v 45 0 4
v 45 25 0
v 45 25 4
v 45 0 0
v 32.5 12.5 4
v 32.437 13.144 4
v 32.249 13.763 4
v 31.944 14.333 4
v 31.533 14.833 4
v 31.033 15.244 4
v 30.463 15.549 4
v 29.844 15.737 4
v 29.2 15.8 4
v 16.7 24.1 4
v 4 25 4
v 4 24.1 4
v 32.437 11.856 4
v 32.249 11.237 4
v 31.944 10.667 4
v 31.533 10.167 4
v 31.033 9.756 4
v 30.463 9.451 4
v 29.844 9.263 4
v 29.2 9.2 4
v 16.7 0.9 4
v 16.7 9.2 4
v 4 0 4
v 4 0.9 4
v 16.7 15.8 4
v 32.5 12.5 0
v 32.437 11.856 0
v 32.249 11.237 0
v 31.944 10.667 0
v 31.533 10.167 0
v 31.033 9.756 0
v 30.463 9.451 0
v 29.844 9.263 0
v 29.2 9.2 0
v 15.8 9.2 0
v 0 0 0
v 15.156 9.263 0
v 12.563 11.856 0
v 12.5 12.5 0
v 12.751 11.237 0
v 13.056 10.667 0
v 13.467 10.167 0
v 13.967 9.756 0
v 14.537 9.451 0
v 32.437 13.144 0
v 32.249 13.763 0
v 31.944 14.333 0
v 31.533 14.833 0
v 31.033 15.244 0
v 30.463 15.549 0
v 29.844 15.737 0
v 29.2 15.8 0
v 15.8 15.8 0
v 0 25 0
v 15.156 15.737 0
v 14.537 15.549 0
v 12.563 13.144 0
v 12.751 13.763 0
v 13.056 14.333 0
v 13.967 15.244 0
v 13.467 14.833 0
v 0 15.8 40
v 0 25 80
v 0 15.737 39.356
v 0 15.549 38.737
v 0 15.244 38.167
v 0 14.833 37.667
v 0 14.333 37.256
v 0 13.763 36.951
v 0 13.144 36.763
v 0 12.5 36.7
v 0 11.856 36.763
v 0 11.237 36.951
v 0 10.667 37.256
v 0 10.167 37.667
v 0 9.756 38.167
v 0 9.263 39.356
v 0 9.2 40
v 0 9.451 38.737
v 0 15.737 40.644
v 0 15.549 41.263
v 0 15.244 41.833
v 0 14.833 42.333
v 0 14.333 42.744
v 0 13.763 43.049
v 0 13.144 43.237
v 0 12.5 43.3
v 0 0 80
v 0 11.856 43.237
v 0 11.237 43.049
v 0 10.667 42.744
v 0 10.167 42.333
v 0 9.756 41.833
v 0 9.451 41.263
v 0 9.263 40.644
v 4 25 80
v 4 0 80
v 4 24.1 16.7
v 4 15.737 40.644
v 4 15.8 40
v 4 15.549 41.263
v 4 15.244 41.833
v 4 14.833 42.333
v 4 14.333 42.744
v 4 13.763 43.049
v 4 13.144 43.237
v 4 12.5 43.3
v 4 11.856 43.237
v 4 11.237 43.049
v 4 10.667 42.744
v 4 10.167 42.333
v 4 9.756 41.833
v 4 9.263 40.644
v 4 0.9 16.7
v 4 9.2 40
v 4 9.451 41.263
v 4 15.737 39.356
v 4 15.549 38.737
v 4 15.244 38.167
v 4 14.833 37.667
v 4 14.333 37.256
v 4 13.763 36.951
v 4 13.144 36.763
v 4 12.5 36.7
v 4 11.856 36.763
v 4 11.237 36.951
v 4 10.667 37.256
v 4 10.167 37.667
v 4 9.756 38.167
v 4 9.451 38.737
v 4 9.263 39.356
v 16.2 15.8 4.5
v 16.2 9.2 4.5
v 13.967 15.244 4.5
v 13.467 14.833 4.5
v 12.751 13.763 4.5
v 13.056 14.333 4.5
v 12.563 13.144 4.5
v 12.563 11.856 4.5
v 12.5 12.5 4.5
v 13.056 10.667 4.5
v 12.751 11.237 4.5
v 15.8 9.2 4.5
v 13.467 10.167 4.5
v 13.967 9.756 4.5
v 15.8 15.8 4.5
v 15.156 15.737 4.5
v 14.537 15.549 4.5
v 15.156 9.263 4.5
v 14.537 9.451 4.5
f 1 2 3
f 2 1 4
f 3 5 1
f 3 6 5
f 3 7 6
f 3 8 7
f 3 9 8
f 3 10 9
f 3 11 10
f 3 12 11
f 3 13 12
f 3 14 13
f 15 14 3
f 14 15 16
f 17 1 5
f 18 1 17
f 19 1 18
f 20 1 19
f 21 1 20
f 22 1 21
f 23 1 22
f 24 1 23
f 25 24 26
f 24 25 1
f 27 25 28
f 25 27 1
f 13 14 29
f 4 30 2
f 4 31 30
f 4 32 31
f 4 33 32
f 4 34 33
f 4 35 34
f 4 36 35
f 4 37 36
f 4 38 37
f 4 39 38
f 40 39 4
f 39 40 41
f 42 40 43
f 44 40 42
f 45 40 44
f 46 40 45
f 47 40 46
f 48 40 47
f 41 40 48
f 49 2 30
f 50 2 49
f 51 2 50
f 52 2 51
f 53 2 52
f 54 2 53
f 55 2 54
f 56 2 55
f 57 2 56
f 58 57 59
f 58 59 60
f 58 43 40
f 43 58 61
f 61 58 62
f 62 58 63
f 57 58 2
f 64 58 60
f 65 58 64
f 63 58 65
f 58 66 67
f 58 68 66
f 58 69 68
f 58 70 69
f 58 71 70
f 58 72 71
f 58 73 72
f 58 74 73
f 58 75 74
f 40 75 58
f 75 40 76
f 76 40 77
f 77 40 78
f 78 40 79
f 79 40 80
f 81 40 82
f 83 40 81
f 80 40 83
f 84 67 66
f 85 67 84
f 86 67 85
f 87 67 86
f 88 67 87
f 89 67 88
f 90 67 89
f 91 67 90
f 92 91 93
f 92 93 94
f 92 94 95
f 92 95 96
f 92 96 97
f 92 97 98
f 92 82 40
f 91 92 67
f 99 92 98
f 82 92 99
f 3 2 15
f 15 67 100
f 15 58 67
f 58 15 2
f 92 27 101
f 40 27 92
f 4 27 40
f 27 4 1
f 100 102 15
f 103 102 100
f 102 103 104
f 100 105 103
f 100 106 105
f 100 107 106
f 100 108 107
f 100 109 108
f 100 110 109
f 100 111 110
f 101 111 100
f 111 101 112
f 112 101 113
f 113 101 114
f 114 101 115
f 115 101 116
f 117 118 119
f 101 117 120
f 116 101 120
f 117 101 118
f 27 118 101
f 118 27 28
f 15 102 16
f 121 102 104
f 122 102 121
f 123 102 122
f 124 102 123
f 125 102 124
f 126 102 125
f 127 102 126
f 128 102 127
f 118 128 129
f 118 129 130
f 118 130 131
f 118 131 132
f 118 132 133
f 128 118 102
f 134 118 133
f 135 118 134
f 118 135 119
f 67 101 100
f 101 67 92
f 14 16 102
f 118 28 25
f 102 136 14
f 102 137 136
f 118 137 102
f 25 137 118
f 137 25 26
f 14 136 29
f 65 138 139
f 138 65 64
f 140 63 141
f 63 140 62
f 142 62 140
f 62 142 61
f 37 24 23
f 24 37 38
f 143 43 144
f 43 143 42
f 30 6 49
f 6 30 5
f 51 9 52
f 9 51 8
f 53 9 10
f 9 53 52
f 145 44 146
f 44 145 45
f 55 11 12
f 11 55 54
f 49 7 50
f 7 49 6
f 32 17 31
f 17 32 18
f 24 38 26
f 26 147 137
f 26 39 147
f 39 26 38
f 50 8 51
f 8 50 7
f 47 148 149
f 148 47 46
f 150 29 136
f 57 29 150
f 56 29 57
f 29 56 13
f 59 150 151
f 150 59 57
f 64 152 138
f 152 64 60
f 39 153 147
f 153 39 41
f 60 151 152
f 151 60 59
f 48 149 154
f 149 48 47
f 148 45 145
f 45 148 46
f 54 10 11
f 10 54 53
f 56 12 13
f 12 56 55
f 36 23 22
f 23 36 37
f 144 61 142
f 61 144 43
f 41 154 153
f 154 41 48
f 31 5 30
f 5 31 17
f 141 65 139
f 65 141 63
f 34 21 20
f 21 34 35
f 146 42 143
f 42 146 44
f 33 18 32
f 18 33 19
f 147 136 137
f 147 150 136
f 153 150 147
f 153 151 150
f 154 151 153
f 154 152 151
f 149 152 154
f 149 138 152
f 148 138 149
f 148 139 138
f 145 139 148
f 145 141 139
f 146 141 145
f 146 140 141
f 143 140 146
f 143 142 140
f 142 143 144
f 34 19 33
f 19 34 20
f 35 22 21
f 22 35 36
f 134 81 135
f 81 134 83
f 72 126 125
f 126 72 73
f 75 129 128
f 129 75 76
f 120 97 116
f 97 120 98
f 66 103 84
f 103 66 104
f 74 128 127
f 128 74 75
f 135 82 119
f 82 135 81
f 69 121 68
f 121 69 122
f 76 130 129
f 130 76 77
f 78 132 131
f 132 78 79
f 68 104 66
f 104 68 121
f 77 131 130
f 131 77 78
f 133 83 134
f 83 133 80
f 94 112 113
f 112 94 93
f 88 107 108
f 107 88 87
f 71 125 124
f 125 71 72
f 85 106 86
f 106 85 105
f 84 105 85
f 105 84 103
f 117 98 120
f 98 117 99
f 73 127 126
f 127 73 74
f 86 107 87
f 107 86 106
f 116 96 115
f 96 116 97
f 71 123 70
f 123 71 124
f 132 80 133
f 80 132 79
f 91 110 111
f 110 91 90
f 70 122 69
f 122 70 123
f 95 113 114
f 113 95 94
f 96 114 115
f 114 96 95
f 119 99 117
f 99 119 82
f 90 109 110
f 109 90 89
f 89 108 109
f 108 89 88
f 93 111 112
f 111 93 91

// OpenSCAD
$fn = 32;

// ----------------------------------------------------------------------
// L-bracket: 45 x 25 x 80 mm
// ----------------------------------------------------------------------

// --- parameters (mm) ---
leg_a = 45;               // horizontal leg, X
leg_b = 80;               // vertical leg, Z
depth = 25;               // bracket depth, Y
thick = 4;                // plate thickness
hole_d = 6.6;             // clearance for M6
slot_l = 20;              // adjustment slot length
rib_leg = 19.8;           // gusset leg
rib_sink = 0.9;           // gusset overlap into the plates

module hole_z(px, py) {
  translate([px, py, -0.5]) cylinder(h = thick + 1, d = hole_d);
}
module hole_x(pz, py) {
  translate([-0.5, py, pz]) rotate([0, 90, 0]) cylinder(h = thick + 1, d = hole_d);
}
module adjust_slot(px, py) {
  hull() {
    translate([px - (slot_l - hole_d) / 2, py, -0.5]) cylinder(h = thick + 1, d = hole_d);
    translate([px + (slot_l - hole_d) / 2, py, -0.5]) cylinder(h = thick + 1, d = hole_d);
  }
}
module gusset() {
  translate([0, depth - rib_sink, 0])
    rotate([90, 0, 0])
      linear_extrude(height = depth - 2 * rib_sink)
        polygon(points = [[rib_sink, rib_sink], [rib_leg, rib_sink], [rib_sink, rib_leg]]);
}

difference() {
  union() {
    /* horizontal leg */
    cube([leg_a, depth, thick]);
    /* vertical leg, overlapping the corner block */
    cube([thick, depth, leg_b]);
    gusset();
  }
  adjust_slot(22.5, 12.5);
  hole_x(40, 12.5);
}
